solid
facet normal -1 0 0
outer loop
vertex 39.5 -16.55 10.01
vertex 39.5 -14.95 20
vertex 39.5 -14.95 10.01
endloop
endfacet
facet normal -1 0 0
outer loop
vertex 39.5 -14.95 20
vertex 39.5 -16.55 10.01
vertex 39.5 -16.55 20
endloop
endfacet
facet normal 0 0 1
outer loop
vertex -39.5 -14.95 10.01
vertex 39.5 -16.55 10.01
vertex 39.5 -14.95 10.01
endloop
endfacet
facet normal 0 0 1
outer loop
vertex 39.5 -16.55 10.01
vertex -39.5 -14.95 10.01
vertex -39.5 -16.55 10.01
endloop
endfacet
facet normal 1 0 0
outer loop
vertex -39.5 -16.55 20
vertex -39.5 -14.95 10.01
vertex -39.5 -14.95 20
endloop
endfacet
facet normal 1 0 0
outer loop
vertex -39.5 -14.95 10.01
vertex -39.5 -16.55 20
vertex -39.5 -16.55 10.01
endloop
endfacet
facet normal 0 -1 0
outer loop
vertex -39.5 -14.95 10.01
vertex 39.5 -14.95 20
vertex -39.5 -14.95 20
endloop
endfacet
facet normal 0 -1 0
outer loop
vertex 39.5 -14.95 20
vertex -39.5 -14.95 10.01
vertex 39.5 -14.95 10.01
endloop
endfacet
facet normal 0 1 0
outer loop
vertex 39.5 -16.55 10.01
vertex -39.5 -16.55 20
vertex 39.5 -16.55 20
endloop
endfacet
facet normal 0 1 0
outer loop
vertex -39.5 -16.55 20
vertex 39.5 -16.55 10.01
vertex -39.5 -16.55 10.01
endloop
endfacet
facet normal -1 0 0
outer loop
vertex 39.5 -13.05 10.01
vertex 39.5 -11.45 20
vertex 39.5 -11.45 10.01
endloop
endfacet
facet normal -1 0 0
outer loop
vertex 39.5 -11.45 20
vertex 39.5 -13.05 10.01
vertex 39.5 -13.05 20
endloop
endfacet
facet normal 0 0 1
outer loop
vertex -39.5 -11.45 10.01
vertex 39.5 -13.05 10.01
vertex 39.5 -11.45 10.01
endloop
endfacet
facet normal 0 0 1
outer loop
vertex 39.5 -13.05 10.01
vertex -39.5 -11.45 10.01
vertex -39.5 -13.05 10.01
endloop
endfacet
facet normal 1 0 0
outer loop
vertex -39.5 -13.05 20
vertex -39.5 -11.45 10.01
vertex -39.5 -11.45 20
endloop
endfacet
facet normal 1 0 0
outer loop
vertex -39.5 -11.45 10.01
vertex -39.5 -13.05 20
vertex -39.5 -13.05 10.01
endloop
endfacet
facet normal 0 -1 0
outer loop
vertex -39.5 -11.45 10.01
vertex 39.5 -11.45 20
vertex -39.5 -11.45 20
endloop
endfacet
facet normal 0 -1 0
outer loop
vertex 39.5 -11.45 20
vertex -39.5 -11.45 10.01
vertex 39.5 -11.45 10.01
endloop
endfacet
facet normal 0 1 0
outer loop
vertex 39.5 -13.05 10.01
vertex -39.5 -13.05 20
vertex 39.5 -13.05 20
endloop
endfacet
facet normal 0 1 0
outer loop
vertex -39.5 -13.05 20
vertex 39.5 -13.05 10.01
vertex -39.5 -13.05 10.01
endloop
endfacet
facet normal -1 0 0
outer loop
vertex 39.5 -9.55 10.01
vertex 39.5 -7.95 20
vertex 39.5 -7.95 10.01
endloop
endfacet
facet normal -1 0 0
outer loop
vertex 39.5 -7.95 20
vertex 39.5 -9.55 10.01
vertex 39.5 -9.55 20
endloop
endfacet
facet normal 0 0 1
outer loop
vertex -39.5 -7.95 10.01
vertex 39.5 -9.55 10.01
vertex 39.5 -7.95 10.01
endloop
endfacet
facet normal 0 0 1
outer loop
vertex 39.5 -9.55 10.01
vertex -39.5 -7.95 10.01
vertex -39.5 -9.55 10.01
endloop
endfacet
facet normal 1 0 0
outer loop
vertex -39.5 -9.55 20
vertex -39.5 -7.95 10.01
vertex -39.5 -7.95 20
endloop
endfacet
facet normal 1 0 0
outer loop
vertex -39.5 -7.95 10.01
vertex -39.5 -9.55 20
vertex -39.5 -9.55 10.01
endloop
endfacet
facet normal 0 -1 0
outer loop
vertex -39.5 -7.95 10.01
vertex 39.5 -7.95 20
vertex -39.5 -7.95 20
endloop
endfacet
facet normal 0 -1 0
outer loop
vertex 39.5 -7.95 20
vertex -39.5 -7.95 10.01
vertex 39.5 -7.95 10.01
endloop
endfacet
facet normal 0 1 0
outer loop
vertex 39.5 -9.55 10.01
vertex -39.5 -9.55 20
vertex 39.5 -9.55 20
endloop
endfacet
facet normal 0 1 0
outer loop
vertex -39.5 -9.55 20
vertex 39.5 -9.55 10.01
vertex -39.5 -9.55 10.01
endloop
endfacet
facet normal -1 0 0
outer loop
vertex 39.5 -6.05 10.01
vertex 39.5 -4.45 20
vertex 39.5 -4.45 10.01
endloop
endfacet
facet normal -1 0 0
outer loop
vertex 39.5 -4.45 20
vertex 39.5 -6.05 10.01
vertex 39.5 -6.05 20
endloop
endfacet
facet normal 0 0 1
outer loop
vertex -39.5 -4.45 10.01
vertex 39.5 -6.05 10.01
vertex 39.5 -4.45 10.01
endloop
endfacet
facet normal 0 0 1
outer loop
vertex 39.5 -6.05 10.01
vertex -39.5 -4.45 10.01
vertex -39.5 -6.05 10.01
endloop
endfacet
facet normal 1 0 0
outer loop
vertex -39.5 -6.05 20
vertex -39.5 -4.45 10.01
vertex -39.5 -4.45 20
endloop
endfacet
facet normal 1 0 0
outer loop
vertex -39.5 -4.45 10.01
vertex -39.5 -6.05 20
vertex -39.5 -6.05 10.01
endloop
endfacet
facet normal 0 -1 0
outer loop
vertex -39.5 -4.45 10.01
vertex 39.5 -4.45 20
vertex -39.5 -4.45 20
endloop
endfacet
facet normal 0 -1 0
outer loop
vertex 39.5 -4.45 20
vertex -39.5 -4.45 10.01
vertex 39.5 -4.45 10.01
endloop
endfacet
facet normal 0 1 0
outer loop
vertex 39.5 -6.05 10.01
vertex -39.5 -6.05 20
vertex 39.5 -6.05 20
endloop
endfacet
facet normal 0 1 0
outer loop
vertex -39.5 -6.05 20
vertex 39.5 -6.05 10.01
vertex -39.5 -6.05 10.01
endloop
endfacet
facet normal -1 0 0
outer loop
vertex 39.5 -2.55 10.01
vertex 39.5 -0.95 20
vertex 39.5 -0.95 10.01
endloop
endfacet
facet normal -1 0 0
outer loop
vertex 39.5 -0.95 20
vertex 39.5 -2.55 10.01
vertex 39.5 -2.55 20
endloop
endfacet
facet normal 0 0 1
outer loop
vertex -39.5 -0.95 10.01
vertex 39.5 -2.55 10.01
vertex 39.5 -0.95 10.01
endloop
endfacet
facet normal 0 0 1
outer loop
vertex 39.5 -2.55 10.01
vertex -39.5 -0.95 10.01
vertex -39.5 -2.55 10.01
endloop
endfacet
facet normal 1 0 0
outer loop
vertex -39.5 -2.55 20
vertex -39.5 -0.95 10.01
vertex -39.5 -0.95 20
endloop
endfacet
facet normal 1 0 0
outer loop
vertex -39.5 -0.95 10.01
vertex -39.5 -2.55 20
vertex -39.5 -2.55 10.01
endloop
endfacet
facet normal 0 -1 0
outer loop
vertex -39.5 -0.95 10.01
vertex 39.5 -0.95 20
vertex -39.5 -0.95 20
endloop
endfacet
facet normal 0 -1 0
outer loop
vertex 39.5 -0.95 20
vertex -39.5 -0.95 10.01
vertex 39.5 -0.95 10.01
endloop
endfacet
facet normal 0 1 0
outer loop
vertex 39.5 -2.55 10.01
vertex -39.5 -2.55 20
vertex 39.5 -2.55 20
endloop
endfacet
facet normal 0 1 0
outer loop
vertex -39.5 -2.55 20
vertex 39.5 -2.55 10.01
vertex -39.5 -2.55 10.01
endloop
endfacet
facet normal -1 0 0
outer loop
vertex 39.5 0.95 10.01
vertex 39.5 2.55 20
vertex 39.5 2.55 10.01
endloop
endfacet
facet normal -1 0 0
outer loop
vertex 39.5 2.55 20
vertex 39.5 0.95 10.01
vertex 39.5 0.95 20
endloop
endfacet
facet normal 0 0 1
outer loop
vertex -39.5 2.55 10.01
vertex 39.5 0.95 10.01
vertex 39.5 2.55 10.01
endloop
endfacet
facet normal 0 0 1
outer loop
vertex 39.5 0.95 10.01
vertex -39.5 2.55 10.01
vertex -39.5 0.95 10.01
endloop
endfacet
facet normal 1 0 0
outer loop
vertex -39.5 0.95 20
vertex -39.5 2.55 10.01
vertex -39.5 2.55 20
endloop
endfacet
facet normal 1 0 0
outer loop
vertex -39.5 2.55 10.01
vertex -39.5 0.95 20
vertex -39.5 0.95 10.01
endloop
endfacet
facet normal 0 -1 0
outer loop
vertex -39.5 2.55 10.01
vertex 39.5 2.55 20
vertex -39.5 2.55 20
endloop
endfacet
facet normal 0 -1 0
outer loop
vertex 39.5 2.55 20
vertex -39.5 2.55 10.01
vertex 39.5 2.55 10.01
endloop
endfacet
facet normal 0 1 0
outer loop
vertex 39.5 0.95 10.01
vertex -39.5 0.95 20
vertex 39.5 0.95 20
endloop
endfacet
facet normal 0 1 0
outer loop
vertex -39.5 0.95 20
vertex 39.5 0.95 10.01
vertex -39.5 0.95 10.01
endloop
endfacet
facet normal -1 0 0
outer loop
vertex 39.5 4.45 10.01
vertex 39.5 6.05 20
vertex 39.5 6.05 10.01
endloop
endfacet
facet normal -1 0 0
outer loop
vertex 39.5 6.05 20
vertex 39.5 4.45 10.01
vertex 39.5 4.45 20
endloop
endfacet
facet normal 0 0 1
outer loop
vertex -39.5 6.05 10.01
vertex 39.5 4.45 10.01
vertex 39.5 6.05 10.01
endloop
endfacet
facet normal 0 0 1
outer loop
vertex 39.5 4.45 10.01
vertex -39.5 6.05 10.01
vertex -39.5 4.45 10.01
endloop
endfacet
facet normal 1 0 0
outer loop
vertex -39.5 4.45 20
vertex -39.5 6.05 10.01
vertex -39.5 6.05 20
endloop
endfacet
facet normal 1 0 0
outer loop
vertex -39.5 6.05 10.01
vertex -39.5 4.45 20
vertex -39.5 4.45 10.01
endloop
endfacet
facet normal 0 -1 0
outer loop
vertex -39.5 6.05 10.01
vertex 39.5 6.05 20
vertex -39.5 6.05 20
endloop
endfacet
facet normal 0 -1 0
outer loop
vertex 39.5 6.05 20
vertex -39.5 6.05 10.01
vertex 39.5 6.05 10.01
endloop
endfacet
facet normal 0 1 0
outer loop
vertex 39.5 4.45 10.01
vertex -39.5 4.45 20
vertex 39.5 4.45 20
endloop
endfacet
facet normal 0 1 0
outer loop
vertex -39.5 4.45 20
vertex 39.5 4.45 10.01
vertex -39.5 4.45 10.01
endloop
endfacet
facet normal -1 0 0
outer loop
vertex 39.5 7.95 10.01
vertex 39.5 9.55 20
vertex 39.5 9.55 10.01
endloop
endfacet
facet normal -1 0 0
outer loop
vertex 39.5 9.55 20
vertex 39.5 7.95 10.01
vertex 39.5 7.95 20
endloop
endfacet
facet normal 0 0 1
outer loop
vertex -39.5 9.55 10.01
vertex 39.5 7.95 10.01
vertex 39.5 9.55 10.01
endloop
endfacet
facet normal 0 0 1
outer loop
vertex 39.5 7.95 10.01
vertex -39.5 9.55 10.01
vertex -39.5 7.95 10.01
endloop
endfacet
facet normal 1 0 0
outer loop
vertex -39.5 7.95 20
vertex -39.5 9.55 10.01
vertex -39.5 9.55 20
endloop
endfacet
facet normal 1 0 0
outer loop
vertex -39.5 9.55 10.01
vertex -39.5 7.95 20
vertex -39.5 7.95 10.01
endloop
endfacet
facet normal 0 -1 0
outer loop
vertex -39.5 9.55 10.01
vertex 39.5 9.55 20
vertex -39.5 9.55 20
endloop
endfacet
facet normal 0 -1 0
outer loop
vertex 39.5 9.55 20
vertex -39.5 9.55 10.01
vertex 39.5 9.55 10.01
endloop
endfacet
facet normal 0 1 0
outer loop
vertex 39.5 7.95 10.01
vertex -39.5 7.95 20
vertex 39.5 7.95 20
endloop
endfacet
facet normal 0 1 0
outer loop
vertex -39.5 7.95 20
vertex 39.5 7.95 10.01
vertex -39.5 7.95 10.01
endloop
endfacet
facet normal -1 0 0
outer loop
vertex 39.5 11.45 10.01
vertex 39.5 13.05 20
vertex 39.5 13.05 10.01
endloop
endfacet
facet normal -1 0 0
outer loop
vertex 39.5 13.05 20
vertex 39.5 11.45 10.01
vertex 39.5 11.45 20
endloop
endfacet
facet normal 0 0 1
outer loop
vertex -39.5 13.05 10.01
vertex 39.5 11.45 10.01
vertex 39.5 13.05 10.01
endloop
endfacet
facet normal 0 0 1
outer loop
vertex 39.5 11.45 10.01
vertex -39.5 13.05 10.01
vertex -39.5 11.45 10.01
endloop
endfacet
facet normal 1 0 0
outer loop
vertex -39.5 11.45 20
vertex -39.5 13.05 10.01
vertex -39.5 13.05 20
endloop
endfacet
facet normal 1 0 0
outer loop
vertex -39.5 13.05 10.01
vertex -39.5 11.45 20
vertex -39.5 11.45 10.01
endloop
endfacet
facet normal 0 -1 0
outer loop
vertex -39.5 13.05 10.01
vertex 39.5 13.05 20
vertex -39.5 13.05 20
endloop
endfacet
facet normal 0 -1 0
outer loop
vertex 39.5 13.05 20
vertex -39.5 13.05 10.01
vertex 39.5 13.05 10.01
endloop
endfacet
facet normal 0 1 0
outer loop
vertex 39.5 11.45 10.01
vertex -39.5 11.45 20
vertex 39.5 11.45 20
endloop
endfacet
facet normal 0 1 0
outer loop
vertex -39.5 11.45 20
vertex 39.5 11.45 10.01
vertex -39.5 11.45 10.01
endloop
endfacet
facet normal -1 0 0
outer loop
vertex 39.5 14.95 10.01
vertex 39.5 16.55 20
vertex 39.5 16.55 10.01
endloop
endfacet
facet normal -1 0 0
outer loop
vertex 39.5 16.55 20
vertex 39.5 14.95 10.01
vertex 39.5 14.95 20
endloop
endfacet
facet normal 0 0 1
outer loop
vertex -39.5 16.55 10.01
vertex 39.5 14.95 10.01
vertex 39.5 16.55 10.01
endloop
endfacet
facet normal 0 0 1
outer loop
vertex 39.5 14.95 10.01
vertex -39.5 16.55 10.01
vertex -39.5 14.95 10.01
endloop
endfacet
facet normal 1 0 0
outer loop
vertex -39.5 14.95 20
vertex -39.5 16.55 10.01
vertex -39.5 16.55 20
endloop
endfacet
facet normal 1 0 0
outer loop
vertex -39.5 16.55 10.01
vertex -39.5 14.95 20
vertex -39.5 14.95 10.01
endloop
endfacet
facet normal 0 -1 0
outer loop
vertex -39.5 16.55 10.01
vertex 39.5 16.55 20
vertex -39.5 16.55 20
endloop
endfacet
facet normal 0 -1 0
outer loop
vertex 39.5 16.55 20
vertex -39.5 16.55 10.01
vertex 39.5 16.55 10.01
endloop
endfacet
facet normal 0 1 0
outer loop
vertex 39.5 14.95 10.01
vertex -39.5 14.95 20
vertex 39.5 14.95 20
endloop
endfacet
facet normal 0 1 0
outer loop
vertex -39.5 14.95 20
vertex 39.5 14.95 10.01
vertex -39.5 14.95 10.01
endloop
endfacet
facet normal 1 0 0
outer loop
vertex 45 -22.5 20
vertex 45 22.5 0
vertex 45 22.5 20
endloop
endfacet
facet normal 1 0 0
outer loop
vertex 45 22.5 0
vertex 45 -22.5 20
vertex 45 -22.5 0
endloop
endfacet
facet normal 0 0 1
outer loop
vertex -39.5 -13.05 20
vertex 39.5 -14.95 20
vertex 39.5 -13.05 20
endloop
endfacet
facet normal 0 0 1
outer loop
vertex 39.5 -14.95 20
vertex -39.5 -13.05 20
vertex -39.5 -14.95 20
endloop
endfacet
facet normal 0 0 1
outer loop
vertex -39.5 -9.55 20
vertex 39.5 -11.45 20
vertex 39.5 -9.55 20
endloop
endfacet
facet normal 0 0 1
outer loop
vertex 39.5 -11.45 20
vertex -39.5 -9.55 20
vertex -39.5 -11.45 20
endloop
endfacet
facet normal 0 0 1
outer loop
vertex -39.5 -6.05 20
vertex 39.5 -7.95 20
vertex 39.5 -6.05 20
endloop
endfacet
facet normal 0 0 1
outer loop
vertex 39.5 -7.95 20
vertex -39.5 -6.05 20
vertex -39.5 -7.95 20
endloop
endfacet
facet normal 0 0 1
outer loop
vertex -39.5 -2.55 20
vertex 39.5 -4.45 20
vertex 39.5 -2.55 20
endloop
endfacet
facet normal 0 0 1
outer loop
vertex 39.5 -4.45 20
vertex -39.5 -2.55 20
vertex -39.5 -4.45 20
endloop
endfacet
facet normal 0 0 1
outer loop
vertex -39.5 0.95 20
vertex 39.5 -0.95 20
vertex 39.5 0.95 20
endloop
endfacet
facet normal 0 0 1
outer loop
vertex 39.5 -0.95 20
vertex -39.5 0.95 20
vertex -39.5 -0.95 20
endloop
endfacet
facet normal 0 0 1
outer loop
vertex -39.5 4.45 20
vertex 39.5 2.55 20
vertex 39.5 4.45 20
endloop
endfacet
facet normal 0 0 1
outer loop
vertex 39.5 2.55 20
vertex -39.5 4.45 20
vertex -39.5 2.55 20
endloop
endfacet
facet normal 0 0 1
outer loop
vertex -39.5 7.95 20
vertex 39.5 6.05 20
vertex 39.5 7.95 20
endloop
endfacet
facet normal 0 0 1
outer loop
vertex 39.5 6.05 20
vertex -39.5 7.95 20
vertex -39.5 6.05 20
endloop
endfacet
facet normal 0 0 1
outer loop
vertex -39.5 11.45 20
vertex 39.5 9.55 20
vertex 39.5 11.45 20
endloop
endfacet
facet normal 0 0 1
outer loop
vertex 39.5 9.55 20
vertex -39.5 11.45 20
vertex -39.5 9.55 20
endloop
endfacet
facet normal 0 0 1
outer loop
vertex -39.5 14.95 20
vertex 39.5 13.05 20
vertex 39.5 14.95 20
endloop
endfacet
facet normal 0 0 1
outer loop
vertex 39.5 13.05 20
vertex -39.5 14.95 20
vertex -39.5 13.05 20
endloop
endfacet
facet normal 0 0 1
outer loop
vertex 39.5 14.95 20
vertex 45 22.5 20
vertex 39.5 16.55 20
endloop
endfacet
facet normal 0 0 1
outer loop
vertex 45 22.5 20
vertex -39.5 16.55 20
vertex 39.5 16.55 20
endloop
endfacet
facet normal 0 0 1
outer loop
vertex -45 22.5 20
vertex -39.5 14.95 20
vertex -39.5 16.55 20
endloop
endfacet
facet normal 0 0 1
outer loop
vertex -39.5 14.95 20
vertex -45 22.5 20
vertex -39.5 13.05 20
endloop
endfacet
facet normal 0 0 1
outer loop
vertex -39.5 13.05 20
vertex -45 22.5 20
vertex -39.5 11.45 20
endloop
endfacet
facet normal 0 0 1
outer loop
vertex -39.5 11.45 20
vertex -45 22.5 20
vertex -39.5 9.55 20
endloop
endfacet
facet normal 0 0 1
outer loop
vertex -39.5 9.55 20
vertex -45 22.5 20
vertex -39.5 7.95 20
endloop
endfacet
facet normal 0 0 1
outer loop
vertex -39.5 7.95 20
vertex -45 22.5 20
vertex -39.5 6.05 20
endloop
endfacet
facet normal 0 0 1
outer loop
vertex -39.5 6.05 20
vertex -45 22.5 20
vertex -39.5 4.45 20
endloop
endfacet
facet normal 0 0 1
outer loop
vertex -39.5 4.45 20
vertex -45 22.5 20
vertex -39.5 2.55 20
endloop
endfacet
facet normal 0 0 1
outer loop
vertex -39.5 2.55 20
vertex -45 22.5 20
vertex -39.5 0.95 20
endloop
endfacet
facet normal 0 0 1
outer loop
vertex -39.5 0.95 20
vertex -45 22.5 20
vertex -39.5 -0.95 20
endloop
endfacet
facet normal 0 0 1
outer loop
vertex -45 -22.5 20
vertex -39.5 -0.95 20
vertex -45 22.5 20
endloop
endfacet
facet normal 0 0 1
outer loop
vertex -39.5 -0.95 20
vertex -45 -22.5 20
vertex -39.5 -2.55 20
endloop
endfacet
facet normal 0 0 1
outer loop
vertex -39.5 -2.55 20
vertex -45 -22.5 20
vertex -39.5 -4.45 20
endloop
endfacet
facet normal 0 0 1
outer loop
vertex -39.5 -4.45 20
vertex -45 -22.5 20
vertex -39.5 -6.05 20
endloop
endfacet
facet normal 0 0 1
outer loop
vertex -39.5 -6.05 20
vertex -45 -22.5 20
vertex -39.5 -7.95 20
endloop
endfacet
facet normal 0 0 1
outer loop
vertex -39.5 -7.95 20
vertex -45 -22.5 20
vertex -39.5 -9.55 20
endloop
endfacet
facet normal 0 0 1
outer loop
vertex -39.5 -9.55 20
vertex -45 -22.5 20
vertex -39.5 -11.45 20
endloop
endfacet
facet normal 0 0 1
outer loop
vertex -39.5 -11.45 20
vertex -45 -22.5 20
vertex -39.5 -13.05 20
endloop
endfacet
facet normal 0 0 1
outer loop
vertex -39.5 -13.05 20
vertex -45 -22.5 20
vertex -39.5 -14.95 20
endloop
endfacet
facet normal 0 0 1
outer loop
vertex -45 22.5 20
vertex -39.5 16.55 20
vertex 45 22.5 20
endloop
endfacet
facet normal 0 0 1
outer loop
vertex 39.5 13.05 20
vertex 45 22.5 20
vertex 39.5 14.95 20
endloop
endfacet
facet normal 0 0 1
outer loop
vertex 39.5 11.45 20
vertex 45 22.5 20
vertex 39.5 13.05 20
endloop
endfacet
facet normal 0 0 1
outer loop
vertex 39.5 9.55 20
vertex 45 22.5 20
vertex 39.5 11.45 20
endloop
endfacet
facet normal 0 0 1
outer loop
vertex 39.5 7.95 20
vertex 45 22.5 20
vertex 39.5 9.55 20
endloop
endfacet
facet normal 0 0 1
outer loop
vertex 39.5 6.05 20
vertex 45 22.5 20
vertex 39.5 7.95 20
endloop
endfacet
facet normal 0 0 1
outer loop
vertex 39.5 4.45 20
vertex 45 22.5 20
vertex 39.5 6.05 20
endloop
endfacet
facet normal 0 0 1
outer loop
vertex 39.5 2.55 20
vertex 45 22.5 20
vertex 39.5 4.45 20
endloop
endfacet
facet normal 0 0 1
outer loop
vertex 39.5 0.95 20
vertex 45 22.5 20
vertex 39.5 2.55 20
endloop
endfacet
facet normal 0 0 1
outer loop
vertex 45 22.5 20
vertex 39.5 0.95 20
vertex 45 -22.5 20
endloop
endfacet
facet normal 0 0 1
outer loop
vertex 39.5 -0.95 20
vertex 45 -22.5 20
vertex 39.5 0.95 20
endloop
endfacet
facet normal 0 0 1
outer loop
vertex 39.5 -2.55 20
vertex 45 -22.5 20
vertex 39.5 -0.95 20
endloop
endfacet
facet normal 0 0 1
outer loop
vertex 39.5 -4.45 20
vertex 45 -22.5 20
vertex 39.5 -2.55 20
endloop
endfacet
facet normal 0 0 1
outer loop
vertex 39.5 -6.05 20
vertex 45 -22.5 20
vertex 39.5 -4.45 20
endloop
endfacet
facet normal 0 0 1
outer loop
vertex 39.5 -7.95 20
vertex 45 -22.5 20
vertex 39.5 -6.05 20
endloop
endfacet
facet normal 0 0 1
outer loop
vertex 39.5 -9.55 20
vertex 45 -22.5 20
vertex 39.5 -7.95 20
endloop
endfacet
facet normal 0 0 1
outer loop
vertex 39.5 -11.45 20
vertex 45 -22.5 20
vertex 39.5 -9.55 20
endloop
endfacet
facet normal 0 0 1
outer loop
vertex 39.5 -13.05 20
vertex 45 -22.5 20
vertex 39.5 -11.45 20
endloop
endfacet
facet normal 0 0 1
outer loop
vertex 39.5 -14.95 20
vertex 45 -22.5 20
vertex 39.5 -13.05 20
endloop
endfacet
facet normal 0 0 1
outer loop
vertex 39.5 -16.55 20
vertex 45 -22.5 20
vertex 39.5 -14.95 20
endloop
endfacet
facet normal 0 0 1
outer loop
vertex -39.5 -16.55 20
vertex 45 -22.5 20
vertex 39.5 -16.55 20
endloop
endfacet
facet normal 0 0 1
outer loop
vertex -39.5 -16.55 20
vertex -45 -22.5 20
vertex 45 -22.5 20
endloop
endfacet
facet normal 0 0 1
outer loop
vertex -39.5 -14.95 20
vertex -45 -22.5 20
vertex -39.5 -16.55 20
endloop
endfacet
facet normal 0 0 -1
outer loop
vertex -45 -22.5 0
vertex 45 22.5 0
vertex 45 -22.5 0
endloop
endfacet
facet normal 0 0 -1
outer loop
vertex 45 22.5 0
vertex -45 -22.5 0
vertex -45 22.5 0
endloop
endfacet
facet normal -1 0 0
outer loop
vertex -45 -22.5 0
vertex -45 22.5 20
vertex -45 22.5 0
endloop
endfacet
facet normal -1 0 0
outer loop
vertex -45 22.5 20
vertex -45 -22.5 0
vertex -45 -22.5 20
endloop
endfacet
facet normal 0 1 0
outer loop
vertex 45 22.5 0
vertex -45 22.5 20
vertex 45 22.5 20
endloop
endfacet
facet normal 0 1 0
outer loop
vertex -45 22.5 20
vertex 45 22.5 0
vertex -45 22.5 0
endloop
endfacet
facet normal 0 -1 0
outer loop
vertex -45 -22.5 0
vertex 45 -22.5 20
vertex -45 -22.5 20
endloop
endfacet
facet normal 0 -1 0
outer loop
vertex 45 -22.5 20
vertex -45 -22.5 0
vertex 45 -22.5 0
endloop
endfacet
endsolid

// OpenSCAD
// Microscope Slide Drying Rack
// Designed for 10 slides (75x25x1mm) standing upright on long edge.

// Block Dimensions
L = 90;             // Length (X)
W = 45;             // Width (Y)
H = 20;             // Height (Z)

// Slot Dimensions
slot_L = 77;        // Slot length (X)
slot_W = 1.6;       // Slot width (Y)
slot_D = 10;        // Slot depth (Z)
num_slots = 10;     // Number of slots
pitch = 3.5;        // Center-to-center spacing (Y)

$fn = 64;

// Calculate the starting Y position to center the group of slots
// The total width occupied by centers is (num_slots - 1) * pitch
// We center this group on the block's Y axis.
y_offset = ((num_slots - 1) * pitch) / 2;

difference() {
    // The main solid base block
    translate([-L/2, -W/2, 0]) {
        cube([L, W, H]);
    }

    // The slots
    // We iterate from 0 to num_slots-1 and calculate the Y position
    for (i = [0 : num_slots - 1]) {
        // Calculate Y center for this specific slot
        // We subtract y_offset to shift the whole group to the center
        slot_y_pos = (i * pitch) - y_offset;
        
        // We translate the slot so it is centered on the X axis
        // and positioned at the calculated Y position.
        // The slot is "open at the top", so we subtract it from the top face.
        // To ensure a clean cut, we extend the slot slightly in Z and X.
        translate([-slot_L/2 - 1, slot_y_pos - slot_W/2, H - slot_D + 0.01]) {
            cube([slot_L + 2, slot_W, slot_D]);
        }
    }
}
